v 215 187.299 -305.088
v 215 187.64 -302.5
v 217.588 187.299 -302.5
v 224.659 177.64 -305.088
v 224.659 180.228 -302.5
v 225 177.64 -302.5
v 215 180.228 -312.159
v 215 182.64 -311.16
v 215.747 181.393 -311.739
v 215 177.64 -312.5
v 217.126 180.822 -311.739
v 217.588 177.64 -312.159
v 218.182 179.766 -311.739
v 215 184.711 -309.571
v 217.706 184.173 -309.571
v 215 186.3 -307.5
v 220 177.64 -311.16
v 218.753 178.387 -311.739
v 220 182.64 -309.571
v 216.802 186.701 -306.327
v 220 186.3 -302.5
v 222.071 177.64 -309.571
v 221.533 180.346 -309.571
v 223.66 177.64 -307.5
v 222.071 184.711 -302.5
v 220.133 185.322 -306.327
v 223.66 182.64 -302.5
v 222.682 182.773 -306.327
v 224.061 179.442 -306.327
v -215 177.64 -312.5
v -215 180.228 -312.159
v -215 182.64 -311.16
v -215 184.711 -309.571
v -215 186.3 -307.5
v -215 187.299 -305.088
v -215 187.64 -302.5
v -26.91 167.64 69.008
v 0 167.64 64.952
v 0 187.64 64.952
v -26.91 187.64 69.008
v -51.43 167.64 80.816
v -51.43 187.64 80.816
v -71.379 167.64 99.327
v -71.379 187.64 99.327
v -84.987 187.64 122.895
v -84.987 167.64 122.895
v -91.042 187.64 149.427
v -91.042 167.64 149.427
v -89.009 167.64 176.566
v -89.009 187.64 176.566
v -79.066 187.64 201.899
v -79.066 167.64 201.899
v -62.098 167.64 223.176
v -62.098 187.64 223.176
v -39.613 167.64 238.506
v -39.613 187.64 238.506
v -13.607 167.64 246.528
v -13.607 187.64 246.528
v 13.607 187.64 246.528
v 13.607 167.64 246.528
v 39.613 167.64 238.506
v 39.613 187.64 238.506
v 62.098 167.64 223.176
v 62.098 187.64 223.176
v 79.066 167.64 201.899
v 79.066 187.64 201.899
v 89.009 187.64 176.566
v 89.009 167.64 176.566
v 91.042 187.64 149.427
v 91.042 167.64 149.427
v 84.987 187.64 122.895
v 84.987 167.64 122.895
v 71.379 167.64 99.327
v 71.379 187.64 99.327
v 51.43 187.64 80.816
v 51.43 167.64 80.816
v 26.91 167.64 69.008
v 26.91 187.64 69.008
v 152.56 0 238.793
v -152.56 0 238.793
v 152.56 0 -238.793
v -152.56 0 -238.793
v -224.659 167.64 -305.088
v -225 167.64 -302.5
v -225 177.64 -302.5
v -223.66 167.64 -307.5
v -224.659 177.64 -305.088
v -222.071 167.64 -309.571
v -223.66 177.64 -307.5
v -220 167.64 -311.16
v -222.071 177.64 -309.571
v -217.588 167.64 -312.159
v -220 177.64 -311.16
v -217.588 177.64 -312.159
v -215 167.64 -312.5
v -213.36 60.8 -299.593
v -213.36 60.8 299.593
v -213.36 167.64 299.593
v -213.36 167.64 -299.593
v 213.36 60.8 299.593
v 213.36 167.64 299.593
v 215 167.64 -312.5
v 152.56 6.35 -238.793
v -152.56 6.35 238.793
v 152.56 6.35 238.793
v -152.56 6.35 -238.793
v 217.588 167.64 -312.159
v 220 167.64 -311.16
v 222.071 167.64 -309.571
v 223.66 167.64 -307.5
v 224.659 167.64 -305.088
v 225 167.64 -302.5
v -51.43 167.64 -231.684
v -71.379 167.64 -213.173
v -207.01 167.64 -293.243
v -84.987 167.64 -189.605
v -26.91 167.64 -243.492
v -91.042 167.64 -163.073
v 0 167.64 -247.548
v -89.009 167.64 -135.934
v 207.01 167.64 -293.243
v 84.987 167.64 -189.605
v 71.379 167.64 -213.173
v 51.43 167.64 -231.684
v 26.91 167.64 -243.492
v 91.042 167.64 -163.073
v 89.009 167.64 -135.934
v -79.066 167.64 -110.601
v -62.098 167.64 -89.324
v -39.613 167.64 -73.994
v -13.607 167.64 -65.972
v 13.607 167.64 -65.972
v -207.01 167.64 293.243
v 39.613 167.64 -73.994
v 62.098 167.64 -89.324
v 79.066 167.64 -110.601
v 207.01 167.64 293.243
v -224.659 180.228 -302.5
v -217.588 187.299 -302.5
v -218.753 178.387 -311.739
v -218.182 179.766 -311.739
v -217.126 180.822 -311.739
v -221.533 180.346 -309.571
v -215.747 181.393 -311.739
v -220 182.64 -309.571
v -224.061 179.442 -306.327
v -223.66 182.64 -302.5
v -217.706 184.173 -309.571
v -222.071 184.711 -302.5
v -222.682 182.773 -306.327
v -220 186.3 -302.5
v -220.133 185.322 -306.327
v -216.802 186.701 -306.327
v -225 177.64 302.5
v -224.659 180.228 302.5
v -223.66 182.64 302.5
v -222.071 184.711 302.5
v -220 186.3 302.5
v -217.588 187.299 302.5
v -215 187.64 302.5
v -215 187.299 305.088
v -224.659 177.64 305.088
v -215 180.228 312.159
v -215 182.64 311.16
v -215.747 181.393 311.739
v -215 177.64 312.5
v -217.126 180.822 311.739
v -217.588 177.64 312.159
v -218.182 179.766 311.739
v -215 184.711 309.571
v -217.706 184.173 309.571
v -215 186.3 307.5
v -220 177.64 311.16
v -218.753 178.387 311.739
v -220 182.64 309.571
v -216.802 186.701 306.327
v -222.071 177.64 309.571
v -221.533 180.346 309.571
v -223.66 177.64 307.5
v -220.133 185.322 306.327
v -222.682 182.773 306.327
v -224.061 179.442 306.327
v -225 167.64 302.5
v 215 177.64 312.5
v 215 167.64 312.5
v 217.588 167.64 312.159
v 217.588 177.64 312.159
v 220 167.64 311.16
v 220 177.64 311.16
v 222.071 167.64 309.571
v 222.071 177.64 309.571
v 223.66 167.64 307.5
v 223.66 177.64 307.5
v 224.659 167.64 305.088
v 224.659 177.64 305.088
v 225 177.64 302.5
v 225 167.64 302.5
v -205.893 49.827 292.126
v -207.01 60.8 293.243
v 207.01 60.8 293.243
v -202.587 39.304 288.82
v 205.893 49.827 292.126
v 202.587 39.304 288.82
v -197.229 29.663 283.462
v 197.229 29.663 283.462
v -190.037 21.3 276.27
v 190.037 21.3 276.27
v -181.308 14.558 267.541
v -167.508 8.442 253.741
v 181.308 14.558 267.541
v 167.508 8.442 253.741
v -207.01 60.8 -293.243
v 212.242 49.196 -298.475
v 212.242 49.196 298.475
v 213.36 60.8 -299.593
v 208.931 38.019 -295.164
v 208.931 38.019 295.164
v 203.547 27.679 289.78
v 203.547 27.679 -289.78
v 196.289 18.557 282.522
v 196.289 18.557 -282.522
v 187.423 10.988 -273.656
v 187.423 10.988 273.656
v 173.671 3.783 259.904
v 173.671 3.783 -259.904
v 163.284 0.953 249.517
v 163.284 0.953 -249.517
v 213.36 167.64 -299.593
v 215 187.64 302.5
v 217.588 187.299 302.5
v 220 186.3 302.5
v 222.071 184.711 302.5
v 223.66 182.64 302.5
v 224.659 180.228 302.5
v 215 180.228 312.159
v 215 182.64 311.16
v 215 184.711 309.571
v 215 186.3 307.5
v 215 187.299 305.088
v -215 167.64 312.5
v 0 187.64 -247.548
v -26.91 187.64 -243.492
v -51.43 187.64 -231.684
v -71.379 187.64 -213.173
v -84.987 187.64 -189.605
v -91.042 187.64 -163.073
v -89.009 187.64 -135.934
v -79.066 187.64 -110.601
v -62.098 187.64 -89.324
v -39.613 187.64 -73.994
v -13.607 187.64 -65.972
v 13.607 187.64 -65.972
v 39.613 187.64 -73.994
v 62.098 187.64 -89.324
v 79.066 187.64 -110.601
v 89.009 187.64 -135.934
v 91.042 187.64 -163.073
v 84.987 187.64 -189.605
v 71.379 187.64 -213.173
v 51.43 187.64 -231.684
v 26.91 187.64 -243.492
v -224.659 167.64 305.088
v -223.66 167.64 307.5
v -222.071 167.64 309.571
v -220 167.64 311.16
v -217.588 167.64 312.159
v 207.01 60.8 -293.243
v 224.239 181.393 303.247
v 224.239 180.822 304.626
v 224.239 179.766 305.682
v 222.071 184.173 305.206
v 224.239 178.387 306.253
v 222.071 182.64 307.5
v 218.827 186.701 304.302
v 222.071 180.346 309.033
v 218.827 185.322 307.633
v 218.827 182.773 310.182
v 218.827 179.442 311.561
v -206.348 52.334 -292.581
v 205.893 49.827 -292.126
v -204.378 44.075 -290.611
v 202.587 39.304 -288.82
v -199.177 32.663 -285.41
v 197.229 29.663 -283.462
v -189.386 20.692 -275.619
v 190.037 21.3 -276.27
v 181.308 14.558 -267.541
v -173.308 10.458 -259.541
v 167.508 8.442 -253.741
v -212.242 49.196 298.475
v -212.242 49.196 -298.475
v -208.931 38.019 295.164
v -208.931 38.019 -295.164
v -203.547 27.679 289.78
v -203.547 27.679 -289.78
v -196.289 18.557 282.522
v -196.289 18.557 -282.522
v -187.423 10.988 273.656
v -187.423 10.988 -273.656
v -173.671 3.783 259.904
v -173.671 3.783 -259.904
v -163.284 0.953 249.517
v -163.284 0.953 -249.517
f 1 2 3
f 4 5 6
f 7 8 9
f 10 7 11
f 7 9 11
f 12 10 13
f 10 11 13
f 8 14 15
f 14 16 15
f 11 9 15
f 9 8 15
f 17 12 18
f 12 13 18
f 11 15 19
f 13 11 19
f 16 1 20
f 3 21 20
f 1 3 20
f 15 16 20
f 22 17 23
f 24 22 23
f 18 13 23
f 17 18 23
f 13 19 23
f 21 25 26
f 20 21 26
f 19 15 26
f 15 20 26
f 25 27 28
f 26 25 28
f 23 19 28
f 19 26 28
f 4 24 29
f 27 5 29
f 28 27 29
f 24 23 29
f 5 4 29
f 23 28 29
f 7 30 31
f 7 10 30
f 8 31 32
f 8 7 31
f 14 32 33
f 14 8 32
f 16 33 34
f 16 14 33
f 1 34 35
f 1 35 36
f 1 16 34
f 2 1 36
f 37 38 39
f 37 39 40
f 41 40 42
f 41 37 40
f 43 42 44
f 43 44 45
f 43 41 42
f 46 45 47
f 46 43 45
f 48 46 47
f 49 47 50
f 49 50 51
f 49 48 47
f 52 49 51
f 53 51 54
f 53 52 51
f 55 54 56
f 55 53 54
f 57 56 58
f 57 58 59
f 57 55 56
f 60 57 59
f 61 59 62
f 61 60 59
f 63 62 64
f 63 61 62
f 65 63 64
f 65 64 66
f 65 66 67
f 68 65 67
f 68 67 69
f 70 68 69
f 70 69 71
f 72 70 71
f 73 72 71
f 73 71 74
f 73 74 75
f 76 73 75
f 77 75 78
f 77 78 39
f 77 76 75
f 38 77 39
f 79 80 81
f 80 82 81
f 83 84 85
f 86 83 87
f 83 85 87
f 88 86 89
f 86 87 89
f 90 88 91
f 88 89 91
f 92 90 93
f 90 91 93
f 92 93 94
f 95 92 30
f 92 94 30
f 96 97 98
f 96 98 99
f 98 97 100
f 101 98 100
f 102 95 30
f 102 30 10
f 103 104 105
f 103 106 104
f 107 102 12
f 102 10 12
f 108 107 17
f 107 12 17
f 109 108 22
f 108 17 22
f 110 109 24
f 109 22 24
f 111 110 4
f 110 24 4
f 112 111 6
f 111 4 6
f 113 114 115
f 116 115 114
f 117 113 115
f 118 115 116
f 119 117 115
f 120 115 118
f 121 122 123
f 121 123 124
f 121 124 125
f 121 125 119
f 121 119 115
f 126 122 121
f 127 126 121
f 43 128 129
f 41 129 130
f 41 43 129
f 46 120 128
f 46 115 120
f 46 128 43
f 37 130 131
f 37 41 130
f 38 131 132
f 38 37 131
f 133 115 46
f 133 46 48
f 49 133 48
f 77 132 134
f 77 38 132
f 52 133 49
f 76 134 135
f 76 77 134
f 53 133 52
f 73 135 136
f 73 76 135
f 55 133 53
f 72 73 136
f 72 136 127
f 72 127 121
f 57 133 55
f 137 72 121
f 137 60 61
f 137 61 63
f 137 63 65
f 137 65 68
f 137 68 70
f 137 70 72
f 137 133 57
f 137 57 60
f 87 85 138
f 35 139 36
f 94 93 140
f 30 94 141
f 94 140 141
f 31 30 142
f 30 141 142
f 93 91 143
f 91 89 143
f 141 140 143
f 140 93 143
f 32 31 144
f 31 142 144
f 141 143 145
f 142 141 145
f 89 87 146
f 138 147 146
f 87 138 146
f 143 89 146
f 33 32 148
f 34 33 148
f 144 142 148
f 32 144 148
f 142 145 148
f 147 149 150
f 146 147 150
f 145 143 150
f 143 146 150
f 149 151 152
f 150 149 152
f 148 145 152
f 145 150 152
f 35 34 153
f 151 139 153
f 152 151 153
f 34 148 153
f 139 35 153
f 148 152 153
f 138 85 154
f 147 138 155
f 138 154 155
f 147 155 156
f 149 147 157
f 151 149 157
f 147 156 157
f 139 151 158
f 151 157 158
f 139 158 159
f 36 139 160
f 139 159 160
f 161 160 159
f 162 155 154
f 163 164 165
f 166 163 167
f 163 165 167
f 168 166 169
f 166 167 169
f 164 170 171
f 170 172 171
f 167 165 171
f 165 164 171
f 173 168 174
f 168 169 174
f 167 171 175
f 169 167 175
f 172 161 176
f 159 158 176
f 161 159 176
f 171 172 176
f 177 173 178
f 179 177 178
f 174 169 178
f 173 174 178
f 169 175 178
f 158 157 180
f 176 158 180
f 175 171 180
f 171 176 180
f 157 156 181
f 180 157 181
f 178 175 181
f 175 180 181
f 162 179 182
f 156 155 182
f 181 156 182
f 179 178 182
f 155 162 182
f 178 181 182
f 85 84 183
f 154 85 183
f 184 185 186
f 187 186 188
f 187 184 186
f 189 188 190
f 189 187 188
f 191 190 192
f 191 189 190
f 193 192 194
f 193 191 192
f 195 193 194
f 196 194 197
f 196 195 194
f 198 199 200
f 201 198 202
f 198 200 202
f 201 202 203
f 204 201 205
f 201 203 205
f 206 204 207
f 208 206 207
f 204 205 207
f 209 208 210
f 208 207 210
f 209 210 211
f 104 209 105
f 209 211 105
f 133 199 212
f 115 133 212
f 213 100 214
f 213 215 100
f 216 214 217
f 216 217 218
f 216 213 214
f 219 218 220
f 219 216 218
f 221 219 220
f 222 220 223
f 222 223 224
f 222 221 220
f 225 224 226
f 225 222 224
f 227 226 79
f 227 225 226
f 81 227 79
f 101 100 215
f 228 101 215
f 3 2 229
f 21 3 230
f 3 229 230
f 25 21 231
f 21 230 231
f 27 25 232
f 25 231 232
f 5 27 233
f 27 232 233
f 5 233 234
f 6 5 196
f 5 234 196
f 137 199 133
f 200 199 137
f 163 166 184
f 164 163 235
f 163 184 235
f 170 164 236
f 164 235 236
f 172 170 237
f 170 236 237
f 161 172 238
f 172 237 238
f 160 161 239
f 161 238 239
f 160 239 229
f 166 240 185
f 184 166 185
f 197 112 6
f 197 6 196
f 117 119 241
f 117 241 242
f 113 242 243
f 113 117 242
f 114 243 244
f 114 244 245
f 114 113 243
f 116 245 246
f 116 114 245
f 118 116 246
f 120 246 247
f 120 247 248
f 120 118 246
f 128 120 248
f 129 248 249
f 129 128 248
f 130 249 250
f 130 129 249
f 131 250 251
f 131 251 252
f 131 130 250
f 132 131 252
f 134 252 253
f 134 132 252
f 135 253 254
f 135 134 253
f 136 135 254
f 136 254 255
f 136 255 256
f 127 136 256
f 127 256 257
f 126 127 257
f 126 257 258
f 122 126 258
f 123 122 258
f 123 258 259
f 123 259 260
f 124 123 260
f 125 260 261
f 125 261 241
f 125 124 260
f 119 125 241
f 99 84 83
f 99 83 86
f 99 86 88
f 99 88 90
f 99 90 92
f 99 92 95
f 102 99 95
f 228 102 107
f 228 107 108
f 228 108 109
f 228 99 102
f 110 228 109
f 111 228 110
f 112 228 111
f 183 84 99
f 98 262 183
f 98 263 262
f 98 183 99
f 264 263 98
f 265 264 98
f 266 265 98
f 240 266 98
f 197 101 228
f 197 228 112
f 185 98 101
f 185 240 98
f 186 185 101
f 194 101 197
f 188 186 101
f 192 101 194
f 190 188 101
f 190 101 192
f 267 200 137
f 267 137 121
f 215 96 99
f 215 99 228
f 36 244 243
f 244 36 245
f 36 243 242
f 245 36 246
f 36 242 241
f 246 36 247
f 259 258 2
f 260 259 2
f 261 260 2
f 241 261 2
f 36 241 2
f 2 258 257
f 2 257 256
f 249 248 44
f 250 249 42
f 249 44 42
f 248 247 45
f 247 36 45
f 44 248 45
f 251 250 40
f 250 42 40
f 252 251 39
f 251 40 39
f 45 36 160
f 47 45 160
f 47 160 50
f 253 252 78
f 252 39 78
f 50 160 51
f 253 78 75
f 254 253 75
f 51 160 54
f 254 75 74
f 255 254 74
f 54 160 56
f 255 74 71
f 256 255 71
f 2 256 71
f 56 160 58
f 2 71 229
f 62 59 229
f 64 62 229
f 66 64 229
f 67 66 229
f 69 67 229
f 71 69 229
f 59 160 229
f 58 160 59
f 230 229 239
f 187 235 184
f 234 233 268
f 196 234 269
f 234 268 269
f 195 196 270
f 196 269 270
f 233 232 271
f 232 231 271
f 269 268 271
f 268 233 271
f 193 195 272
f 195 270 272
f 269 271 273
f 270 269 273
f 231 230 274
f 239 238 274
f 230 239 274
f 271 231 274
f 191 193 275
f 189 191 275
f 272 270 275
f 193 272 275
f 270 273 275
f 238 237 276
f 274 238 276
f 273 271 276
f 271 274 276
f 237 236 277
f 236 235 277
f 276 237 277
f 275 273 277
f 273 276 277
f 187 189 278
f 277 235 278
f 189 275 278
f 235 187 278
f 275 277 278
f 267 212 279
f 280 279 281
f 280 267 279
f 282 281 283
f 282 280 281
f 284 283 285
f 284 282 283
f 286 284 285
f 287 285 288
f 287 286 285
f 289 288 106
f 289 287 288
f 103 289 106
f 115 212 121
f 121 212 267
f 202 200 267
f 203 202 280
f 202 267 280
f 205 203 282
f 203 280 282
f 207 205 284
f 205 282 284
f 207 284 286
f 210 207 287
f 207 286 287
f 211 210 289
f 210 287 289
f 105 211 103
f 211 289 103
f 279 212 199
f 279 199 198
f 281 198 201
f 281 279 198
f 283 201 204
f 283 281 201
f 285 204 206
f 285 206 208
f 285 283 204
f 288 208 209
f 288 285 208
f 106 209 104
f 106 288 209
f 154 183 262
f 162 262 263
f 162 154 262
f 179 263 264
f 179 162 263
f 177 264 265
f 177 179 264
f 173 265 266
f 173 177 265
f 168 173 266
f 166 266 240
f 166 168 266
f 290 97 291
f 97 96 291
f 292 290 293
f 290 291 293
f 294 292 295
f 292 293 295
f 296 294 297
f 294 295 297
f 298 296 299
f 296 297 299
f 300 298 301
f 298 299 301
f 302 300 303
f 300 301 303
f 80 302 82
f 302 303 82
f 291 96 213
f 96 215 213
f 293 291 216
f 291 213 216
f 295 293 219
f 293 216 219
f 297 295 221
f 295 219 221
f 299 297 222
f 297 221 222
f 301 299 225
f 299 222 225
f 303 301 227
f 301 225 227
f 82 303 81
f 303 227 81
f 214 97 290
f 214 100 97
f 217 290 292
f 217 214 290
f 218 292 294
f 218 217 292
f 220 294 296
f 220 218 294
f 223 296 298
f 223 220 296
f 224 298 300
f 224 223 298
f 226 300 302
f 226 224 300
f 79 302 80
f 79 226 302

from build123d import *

# Parameters (mm, degrees)
SKETCH1_W           = 426.72
SKETCH1_H           = 599.186
BOSS_EXTRUDE1_DEPTH = 167.64
FILLET1_R           = 60.8
SHELL4_T            = -6.35
BOSS_EXTRUDE3_START = -167.64
SKETCH7_W           = 450
SKETCH7_H           = 625
BOSS_EXTRUDE3_DEPTH = 20
CUT_EXTRUDE4_START  = 167.64
SKETCH8_R           = 91.297613413
CUT_EXTRUDE4_DEPTH  = 20
FILLET4_R           = 10


with BuildPart() as part:
    # Sketch1 → Boss-Extrude1 (new body)
    with BuildSketch(Plane(origin=(0, 0, 0), x_dir=(1, 0, 0), z_dir=(0, 1, 0))):
        Rectangle(SKETCH1_W, SKETCH1_H)
    extrude(amount=BOSS_EXTRUDE1_DEPTH)

    # Fillet1
    fillet1_edges = [part.edges().sort_by_distance(p)[0] for p in [
        (0, 0, 299.593),
        (-213.36, 0, 0),
        (0, 0, -299.593),
        (213.36, 0, 0),
    ]]
    fillet(fillet1_edges, radius=FILLET1_R)

    # Shell4
    shell4_openings = [part.faces().sort_by_distance(p)[0] for p in [
        (0, 167.64, 0),
    ]]
    offset(amount=SHELL4_T, openings=shell4_openings)

    # Sketch7 → Boss-Extrude3 (add)
    with BuildSketch(Plane.XZ.offset(BOSS_EXTRUDE3_START)):
        Rectangle(SKETCH7_W, SKETCH7_H)
    extrude(amount=-BOSS_EXTRUDE3_DEPTH)

    # Sketch8 → Cut-Extrude4 (cut)
    with BuildSketch(Plane(origin=(0, 0, 0), x_dir=(1, 0, 0), z_dir=(0, 1, 0)).offset(CUT_EXTRUDE4_START)):
        with Locations(Location((0, -156.25, 0), (0, 0, 90))):
            Circle(SKETCH8_R)
        with Locations(Location((0, 156.25, 0), (0, 0, 90))):
            Circle(SKETCH8_R)
    extrude(amount=CUT_EXTRUDE4_DEPTH, mode=Mode.SUBTRACT)

    # Fillet4
    fillet4_edges = [part.edges().sort_by_distance(p)[0] for p in [
        (-225, 187.64, 0),
        (-225, 177.64, -312.5),
        (0, 187.64, 312.5),
        (-225, 177.64, 312.5),
        (225, 187.64, 0),
        (225, 177.64, 312.5),
        (0, 187.64, -312.5),
        (225, 177.64, -312.5),
    ]]
    fillet(fillet4_edges, radius=FILLET4_R)


solid = part.part
